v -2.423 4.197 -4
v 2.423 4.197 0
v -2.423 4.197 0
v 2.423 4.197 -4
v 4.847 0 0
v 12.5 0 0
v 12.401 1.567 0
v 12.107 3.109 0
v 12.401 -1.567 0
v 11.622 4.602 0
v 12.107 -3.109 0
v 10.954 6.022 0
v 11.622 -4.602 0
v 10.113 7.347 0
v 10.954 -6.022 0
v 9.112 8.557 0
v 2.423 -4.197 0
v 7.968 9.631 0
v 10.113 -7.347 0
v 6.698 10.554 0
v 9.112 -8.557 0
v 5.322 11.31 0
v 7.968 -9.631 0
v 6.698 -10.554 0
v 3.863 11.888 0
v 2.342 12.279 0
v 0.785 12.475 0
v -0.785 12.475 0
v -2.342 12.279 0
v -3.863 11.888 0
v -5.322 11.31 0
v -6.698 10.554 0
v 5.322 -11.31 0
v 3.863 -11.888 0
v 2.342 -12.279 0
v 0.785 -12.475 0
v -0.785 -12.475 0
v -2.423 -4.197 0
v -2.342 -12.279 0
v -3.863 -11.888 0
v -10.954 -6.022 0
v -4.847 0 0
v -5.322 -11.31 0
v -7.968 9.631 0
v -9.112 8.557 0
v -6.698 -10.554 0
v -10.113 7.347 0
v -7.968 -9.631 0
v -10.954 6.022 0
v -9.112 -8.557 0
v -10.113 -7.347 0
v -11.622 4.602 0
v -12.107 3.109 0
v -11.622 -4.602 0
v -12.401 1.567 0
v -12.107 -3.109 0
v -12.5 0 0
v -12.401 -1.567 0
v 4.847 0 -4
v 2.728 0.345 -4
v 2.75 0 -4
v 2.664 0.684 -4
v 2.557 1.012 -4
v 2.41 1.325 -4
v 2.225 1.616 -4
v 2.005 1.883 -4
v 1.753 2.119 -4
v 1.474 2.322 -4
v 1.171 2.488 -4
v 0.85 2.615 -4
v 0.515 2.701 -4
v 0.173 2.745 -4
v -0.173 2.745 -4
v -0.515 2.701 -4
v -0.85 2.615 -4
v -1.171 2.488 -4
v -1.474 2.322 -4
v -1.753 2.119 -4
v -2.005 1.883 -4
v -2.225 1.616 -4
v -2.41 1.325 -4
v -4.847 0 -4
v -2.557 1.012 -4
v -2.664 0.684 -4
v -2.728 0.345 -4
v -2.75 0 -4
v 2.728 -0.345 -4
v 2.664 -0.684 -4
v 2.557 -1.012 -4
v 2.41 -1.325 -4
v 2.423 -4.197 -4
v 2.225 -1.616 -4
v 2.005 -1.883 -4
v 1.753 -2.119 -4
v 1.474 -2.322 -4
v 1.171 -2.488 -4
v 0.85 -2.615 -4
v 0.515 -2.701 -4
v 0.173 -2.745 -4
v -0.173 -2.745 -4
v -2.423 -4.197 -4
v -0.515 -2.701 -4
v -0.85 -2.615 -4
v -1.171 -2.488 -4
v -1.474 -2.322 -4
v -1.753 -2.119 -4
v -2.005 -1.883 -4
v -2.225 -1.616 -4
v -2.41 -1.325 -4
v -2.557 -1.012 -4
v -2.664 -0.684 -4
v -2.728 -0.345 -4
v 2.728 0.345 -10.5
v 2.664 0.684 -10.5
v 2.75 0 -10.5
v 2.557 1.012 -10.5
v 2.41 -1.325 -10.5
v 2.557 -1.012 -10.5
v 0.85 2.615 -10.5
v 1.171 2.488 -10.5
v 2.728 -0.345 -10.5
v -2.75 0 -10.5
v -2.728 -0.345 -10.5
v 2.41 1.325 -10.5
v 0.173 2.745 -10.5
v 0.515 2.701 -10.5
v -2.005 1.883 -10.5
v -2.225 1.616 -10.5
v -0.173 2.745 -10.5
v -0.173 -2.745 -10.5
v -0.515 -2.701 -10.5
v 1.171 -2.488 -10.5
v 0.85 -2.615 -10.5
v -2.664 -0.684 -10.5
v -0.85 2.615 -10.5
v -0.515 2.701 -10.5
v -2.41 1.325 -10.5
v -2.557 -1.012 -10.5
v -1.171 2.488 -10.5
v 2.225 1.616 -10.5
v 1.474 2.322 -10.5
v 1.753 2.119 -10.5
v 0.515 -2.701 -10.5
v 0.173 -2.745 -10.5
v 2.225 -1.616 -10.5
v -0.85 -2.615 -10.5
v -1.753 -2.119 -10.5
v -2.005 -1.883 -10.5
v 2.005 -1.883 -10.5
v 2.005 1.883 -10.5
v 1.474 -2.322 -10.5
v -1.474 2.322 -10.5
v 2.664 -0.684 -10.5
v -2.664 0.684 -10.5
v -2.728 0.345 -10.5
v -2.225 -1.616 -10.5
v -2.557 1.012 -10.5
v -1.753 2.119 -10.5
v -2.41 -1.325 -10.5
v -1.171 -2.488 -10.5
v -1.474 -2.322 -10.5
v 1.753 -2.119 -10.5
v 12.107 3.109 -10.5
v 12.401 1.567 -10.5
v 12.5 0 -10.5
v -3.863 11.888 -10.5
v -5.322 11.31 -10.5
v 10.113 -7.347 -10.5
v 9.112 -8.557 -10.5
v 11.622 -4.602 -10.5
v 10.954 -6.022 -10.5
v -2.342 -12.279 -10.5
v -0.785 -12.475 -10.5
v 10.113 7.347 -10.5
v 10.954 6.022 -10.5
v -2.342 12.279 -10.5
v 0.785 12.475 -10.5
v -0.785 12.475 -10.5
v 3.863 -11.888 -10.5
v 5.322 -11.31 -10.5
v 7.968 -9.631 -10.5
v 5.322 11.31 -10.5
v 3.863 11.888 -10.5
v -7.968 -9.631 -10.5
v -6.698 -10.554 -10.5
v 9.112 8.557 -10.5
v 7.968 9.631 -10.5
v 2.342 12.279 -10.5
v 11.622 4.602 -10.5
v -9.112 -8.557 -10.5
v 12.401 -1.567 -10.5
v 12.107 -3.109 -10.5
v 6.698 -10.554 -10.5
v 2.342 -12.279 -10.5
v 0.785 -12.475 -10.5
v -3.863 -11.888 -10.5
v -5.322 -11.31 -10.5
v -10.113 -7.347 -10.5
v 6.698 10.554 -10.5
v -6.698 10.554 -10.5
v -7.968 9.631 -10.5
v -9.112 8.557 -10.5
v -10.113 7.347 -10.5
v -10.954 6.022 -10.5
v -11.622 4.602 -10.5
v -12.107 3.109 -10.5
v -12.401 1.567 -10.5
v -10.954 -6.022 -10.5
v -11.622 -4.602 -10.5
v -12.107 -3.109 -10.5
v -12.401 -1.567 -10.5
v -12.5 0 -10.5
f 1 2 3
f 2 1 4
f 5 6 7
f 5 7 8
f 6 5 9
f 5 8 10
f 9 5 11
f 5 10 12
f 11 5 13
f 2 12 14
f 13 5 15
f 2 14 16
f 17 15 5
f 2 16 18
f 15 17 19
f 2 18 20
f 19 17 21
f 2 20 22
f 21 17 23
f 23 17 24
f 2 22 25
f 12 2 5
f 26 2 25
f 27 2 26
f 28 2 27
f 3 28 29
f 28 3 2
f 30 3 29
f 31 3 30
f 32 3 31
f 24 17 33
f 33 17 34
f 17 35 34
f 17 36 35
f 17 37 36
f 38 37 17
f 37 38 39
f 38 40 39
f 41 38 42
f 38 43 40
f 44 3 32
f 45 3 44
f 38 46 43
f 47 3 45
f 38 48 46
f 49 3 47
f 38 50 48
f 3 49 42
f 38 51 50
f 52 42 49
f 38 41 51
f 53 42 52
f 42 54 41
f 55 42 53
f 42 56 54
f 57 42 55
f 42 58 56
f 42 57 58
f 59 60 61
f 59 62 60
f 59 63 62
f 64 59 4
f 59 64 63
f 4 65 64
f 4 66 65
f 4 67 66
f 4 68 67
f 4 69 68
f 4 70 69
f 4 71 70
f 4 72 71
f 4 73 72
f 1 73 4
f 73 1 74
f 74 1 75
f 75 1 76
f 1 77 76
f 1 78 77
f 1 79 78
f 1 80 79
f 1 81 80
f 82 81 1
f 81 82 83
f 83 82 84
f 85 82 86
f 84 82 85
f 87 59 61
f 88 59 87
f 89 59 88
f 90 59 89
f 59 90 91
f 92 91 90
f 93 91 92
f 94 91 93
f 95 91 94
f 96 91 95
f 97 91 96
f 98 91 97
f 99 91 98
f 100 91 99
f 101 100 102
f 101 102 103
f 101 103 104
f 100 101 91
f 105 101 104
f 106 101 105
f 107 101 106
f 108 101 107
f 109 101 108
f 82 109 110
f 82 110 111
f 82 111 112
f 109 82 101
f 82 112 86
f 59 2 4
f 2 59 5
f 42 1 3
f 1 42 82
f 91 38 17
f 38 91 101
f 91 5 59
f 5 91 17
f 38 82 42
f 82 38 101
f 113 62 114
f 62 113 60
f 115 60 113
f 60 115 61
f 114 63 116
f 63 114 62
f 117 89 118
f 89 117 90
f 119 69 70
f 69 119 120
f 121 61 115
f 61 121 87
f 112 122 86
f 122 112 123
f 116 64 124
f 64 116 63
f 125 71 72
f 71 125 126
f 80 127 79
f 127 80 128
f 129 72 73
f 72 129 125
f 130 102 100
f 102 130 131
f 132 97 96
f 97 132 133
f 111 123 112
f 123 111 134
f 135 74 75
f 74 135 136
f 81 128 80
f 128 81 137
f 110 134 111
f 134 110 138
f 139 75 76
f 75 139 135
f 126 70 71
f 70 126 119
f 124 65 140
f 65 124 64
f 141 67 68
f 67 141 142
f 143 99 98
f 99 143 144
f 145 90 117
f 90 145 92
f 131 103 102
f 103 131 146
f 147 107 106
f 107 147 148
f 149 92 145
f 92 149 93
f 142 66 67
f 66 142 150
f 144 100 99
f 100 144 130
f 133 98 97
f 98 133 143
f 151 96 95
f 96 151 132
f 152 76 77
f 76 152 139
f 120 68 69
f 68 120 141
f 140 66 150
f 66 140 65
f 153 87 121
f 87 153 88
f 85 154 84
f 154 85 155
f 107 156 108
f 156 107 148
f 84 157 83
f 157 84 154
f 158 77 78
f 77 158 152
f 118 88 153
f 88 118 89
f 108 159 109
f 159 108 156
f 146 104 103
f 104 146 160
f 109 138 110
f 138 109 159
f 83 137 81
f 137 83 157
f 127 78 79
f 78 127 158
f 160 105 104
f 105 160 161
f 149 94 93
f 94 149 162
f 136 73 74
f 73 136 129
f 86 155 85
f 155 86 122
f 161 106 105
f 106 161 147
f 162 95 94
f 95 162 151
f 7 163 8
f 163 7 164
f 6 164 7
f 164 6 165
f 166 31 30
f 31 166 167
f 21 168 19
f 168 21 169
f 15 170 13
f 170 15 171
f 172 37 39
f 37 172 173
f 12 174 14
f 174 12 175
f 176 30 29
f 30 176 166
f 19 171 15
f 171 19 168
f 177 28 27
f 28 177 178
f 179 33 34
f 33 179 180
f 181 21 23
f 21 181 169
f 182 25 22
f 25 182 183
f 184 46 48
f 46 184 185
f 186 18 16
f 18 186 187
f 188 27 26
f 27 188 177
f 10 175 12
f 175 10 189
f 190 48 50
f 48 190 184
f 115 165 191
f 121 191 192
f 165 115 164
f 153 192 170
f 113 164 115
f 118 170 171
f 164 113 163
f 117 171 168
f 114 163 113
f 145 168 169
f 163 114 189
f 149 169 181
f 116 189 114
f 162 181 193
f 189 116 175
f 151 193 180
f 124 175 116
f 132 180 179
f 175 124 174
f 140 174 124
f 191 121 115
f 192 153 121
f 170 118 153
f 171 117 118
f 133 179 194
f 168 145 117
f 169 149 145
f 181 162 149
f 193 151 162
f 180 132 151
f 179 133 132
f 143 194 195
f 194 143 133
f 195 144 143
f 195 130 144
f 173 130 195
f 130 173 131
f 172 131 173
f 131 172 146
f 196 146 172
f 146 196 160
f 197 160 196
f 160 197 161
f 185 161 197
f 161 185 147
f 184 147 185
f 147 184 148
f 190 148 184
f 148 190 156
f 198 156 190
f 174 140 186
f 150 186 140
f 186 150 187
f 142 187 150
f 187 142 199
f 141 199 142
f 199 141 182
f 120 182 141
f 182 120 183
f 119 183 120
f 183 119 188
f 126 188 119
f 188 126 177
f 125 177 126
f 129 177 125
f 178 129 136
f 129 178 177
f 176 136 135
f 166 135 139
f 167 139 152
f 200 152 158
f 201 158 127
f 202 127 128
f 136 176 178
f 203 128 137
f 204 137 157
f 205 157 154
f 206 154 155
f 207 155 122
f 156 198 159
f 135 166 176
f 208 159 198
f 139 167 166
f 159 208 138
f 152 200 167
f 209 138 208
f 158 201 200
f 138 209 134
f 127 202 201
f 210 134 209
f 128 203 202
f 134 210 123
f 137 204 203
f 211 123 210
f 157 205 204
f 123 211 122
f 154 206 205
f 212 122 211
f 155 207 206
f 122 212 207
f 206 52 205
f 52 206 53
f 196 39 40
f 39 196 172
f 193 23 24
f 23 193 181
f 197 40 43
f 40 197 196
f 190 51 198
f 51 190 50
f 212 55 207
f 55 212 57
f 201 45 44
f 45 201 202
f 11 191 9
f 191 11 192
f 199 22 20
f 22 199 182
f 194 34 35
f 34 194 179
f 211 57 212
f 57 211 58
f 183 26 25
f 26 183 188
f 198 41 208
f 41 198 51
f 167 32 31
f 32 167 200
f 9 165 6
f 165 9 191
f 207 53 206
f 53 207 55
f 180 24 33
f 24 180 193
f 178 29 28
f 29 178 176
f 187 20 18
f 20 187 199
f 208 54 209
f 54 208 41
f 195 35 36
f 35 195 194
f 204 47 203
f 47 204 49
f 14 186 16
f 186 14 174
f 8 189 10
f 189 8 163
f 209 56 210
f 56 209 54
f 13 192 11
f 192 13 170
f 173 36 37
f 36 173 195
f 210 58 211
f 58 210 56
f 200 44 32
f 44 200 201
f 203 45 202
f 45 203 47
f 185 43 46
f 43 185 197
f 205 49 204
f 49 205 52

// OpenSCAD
$fn = 50;

difference() {
	union() {
		translate(v = [0, 0, -10.5]) {
			cylinder(h = 10.5, r = 12.5);
		}
	}
	union() {
		translate(v = [0, 0, 0]) {
			rotate(a = [0, 0, 0]) {
				difference() {
					union() {
						translate(v = [0, 0, -4]) {
							linear_extrude(height = 4) {
								polygon(points = [[4.8468, 0.0], [2.4234000000000004, 4.197451927062417], [-2.423399999999999, 4.197451927062417], [-4.8468, 5.935618106107392e-16], [-2.423400000000002, -4.197451927062416], [2.423399999999997, -4.197451927062419]]);
							}
						}
					}
					union();
				}
			}
		}
		#translate(v = [0, 0, -100.0]) {
			cylinder(h = 200, r = 2.75);
		}
	}
}
